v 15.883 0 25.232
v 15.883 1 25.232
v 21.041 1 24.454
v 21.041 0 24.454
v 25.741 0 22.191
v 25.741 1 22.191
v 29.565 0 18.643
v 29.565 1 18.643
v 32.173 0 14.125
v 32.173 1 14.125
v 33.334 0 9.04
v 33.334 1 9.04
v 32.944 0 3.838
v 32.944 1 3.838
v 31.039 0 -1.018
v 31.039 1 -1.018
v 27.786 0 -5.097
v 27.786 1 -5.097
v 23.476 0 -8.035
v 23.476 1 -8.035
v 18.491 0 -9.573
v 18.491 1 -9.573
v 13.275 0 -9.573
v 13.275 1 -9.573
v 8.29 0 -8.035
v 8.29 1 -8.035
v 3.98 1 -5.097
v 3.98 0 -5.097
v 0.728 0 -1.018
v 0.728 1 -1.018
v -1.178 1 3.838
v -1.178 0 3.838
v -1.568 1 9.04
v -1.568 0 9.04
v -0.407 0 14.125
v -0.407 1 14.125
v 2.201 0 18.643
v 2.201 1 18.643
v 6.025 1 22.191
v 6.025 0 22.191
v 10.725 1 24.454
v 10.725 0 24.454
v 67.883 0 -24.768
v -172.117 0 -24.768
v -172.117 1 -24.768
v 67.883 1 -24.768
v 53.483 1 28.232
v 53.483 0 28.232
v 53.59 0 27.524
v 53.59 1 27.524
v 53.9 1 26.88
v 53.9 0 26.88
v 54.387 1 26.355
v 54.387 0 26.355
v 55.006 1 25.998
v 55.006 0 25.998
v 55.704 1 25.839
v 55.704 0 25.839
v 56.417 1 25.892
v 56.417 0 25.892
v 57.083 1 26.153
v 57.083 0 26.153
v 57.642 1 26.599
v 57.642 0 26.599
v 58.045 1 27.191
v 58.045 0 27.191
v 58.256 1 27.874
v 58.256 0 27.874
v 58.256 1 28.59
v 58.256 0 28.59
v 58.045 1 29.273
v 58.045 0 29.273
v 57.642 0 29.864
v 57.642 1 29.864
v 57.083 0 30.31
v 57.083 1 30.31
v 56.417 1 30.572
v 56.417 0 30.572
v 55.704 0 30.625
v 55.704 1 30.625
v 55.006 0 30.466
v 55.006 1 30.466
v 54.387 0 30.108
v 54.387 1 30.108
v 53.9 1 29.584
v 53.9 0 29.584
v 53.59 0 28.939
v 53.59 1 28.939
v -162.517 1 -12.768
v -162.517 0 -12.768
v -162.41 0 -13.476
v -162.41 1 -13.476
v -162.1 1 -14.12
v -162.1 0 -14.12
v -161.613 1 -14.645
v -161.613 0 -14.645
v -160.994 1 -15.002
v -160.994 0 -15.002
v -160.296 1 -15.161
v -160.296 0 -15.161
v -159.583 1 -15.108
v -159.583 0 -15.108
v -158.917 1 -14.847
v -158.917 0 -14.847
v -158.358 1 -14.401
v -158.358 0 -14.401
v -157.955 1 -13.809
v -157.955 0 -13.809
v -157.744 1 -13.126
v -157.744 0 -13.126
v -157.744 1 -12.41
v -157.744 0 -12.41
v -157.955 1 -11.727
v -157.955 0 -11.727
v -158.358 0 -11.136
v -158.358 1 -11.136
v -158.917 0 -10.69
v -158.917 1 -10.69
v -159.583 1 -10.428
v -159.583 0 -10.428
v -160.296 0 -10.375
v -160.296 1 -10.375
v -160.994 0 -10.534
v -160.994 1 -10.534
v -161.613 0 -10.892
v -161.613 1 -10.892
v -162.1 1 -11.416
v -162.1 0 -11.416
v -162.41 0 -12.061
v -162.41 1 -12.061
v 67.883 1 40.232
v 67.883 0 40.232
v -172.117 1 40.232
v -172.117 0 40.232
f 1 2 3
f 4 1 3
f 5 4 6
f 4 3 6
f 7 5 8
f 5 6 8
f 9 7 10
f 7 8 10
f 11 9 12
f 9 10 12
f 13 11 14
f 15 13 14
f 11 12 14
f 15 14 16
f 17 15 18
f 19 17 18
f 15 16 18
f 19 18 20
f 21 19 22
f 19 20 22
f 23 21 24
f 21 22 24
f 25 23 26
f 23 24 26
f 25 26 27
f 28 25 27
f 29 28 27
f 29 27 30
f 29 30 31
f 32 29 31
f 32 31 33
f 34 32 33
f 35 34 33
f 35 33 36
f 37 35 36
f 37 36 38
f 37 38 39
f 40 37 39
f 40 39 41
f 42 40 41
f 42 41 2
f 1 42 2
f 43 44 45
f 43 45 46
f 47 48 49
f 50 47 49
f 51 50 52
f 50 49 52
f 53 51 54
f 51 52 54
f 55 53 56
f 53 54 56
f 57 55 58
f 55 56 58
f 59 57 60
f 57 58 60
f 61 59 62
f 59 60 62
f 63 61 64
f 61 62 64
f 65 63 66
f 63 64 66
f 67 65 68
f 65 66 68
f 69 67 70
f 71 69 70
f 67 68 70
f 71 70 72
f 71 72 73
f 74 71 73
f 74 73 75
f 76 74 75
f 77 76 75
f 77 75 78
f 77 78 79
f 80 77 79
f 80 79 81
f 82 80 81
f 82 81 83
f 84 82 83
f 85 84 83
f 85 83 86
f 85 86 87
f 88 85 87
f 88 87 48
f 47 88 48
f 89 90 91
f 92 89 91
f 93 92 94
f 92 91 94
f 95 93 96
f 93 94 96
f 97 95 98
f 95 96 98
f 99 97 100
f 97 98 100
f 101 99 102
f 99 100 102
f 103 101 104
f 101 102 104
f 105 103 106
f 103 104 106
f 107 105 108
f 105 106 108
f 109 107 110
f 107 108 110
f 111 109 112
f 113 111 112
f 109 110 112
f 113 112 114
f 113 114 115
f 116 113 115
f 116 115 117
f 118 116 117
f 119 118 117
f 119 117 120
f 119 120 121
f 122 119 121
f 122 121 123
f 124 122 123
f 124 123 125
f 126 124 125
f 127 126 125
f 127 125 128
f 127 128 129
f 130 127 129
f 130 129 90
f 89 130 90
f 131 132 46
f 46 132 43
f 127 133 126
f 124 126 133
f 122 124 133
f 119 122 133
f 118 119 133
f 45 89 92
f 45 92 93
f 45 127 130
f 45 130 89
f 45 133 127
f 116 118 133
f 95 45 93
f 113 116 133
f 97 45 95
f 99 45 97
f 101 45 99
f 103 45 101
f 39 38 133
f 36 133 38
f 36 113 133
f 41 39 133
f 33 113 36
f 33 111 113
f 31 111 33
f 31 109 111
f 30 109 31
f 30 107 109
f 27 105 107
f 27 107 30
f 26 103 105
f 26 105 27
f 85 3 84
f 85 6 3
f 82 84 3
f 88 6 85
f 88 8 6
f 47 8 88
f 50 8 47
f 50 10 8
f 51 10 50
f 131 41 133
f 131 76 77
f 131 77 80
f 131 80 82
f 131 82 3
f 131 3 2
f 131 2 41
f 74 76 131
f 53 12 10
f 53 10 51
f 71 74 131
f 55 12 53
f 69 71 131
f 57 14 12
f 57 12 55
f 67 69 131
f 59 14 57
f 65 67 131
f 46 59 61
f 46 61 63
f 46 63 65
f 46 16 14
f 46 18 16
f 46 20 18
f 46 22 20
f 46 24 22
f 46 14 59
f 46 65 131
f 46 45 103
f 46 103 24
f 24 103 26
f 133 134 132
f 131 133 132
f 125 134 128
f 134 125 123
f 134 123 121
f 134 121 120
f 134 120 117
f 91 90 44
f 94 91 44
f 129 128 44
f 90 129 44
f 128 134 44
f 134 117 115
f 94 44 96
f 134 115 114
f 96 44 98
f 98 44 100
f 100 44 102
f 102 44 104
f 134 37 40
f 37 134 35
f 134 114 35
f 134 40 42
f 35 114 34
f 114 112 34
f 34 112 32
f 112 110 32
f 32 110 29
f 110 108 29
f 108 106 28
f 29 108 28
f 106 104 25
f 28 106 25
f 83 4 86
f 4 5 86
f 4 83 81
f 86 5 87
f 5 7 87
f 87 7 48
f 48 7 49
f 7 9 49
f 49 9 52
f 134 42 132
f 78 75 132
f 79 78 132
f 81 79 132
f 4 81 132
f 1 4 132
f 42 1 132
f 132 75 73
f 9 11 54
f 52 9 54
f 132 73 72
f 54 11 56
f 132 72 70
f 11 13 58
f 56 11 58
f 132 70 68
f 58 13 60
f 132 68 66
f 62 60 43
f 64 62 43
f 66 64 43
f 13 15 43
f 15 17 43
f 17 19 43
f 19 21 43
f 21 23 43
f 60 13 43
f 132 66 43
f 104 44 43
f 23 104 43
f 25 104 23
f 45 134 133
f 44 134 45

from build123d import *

# Parameters (mm, degrees)
SKETCH1_W            = 240
SKETCH1_H            = 65
BOSS_EXTRUDE1_DEPTH  = 1
M4_CLEARANCE_SLOT1_D = 4.8
SKETCH4_R            = 17.5
CUT_EXTRUDE1_DEPTH   = 5


with BuildPart() as part:
    # Sketch1 → Boss-Extrude1 (new body)
    with BuildSketch(Plane(origin=(0, 0, 0), x_dir=(1, 0, 0), z_dir=(0, 1, 0))):
        with Locations((-52.116935484, -7.731854839)):
            Rectangle(SKETCH1_W, SKETCH1_H)
    extrude(amount=BOSS_EXTRUDE1_DEPTH)

    # M4 Clearance Slot1 (through all)
    with Locations(Plane(origin=(0, 1, 0), x_dir=(1, 0, 0), z_dir=(0, 1, 0))):
        with Locations((-160.116935484, 12.768145161), (55.883064516, -28.231854839)):
            Hole(M4_CLEARANCE_SLOT1_D / 2)

    # Sketch4 → Cut-Extrude1 (cut)
    with BuildSketch(Plane(origin=(0, 1, 0), x_dir=(1, 0, 0), z_dir=(0, 1, 0))):
        with Locations(Location((15.883064516, -7.731854839, 0), (0, 0, 270))):
            Circle(SKETCH4_R)
    extrude(amount=-CUT_EXTRUDE1_DEPTH, mode=Mode.SUBTRACT)


solid = part.part
